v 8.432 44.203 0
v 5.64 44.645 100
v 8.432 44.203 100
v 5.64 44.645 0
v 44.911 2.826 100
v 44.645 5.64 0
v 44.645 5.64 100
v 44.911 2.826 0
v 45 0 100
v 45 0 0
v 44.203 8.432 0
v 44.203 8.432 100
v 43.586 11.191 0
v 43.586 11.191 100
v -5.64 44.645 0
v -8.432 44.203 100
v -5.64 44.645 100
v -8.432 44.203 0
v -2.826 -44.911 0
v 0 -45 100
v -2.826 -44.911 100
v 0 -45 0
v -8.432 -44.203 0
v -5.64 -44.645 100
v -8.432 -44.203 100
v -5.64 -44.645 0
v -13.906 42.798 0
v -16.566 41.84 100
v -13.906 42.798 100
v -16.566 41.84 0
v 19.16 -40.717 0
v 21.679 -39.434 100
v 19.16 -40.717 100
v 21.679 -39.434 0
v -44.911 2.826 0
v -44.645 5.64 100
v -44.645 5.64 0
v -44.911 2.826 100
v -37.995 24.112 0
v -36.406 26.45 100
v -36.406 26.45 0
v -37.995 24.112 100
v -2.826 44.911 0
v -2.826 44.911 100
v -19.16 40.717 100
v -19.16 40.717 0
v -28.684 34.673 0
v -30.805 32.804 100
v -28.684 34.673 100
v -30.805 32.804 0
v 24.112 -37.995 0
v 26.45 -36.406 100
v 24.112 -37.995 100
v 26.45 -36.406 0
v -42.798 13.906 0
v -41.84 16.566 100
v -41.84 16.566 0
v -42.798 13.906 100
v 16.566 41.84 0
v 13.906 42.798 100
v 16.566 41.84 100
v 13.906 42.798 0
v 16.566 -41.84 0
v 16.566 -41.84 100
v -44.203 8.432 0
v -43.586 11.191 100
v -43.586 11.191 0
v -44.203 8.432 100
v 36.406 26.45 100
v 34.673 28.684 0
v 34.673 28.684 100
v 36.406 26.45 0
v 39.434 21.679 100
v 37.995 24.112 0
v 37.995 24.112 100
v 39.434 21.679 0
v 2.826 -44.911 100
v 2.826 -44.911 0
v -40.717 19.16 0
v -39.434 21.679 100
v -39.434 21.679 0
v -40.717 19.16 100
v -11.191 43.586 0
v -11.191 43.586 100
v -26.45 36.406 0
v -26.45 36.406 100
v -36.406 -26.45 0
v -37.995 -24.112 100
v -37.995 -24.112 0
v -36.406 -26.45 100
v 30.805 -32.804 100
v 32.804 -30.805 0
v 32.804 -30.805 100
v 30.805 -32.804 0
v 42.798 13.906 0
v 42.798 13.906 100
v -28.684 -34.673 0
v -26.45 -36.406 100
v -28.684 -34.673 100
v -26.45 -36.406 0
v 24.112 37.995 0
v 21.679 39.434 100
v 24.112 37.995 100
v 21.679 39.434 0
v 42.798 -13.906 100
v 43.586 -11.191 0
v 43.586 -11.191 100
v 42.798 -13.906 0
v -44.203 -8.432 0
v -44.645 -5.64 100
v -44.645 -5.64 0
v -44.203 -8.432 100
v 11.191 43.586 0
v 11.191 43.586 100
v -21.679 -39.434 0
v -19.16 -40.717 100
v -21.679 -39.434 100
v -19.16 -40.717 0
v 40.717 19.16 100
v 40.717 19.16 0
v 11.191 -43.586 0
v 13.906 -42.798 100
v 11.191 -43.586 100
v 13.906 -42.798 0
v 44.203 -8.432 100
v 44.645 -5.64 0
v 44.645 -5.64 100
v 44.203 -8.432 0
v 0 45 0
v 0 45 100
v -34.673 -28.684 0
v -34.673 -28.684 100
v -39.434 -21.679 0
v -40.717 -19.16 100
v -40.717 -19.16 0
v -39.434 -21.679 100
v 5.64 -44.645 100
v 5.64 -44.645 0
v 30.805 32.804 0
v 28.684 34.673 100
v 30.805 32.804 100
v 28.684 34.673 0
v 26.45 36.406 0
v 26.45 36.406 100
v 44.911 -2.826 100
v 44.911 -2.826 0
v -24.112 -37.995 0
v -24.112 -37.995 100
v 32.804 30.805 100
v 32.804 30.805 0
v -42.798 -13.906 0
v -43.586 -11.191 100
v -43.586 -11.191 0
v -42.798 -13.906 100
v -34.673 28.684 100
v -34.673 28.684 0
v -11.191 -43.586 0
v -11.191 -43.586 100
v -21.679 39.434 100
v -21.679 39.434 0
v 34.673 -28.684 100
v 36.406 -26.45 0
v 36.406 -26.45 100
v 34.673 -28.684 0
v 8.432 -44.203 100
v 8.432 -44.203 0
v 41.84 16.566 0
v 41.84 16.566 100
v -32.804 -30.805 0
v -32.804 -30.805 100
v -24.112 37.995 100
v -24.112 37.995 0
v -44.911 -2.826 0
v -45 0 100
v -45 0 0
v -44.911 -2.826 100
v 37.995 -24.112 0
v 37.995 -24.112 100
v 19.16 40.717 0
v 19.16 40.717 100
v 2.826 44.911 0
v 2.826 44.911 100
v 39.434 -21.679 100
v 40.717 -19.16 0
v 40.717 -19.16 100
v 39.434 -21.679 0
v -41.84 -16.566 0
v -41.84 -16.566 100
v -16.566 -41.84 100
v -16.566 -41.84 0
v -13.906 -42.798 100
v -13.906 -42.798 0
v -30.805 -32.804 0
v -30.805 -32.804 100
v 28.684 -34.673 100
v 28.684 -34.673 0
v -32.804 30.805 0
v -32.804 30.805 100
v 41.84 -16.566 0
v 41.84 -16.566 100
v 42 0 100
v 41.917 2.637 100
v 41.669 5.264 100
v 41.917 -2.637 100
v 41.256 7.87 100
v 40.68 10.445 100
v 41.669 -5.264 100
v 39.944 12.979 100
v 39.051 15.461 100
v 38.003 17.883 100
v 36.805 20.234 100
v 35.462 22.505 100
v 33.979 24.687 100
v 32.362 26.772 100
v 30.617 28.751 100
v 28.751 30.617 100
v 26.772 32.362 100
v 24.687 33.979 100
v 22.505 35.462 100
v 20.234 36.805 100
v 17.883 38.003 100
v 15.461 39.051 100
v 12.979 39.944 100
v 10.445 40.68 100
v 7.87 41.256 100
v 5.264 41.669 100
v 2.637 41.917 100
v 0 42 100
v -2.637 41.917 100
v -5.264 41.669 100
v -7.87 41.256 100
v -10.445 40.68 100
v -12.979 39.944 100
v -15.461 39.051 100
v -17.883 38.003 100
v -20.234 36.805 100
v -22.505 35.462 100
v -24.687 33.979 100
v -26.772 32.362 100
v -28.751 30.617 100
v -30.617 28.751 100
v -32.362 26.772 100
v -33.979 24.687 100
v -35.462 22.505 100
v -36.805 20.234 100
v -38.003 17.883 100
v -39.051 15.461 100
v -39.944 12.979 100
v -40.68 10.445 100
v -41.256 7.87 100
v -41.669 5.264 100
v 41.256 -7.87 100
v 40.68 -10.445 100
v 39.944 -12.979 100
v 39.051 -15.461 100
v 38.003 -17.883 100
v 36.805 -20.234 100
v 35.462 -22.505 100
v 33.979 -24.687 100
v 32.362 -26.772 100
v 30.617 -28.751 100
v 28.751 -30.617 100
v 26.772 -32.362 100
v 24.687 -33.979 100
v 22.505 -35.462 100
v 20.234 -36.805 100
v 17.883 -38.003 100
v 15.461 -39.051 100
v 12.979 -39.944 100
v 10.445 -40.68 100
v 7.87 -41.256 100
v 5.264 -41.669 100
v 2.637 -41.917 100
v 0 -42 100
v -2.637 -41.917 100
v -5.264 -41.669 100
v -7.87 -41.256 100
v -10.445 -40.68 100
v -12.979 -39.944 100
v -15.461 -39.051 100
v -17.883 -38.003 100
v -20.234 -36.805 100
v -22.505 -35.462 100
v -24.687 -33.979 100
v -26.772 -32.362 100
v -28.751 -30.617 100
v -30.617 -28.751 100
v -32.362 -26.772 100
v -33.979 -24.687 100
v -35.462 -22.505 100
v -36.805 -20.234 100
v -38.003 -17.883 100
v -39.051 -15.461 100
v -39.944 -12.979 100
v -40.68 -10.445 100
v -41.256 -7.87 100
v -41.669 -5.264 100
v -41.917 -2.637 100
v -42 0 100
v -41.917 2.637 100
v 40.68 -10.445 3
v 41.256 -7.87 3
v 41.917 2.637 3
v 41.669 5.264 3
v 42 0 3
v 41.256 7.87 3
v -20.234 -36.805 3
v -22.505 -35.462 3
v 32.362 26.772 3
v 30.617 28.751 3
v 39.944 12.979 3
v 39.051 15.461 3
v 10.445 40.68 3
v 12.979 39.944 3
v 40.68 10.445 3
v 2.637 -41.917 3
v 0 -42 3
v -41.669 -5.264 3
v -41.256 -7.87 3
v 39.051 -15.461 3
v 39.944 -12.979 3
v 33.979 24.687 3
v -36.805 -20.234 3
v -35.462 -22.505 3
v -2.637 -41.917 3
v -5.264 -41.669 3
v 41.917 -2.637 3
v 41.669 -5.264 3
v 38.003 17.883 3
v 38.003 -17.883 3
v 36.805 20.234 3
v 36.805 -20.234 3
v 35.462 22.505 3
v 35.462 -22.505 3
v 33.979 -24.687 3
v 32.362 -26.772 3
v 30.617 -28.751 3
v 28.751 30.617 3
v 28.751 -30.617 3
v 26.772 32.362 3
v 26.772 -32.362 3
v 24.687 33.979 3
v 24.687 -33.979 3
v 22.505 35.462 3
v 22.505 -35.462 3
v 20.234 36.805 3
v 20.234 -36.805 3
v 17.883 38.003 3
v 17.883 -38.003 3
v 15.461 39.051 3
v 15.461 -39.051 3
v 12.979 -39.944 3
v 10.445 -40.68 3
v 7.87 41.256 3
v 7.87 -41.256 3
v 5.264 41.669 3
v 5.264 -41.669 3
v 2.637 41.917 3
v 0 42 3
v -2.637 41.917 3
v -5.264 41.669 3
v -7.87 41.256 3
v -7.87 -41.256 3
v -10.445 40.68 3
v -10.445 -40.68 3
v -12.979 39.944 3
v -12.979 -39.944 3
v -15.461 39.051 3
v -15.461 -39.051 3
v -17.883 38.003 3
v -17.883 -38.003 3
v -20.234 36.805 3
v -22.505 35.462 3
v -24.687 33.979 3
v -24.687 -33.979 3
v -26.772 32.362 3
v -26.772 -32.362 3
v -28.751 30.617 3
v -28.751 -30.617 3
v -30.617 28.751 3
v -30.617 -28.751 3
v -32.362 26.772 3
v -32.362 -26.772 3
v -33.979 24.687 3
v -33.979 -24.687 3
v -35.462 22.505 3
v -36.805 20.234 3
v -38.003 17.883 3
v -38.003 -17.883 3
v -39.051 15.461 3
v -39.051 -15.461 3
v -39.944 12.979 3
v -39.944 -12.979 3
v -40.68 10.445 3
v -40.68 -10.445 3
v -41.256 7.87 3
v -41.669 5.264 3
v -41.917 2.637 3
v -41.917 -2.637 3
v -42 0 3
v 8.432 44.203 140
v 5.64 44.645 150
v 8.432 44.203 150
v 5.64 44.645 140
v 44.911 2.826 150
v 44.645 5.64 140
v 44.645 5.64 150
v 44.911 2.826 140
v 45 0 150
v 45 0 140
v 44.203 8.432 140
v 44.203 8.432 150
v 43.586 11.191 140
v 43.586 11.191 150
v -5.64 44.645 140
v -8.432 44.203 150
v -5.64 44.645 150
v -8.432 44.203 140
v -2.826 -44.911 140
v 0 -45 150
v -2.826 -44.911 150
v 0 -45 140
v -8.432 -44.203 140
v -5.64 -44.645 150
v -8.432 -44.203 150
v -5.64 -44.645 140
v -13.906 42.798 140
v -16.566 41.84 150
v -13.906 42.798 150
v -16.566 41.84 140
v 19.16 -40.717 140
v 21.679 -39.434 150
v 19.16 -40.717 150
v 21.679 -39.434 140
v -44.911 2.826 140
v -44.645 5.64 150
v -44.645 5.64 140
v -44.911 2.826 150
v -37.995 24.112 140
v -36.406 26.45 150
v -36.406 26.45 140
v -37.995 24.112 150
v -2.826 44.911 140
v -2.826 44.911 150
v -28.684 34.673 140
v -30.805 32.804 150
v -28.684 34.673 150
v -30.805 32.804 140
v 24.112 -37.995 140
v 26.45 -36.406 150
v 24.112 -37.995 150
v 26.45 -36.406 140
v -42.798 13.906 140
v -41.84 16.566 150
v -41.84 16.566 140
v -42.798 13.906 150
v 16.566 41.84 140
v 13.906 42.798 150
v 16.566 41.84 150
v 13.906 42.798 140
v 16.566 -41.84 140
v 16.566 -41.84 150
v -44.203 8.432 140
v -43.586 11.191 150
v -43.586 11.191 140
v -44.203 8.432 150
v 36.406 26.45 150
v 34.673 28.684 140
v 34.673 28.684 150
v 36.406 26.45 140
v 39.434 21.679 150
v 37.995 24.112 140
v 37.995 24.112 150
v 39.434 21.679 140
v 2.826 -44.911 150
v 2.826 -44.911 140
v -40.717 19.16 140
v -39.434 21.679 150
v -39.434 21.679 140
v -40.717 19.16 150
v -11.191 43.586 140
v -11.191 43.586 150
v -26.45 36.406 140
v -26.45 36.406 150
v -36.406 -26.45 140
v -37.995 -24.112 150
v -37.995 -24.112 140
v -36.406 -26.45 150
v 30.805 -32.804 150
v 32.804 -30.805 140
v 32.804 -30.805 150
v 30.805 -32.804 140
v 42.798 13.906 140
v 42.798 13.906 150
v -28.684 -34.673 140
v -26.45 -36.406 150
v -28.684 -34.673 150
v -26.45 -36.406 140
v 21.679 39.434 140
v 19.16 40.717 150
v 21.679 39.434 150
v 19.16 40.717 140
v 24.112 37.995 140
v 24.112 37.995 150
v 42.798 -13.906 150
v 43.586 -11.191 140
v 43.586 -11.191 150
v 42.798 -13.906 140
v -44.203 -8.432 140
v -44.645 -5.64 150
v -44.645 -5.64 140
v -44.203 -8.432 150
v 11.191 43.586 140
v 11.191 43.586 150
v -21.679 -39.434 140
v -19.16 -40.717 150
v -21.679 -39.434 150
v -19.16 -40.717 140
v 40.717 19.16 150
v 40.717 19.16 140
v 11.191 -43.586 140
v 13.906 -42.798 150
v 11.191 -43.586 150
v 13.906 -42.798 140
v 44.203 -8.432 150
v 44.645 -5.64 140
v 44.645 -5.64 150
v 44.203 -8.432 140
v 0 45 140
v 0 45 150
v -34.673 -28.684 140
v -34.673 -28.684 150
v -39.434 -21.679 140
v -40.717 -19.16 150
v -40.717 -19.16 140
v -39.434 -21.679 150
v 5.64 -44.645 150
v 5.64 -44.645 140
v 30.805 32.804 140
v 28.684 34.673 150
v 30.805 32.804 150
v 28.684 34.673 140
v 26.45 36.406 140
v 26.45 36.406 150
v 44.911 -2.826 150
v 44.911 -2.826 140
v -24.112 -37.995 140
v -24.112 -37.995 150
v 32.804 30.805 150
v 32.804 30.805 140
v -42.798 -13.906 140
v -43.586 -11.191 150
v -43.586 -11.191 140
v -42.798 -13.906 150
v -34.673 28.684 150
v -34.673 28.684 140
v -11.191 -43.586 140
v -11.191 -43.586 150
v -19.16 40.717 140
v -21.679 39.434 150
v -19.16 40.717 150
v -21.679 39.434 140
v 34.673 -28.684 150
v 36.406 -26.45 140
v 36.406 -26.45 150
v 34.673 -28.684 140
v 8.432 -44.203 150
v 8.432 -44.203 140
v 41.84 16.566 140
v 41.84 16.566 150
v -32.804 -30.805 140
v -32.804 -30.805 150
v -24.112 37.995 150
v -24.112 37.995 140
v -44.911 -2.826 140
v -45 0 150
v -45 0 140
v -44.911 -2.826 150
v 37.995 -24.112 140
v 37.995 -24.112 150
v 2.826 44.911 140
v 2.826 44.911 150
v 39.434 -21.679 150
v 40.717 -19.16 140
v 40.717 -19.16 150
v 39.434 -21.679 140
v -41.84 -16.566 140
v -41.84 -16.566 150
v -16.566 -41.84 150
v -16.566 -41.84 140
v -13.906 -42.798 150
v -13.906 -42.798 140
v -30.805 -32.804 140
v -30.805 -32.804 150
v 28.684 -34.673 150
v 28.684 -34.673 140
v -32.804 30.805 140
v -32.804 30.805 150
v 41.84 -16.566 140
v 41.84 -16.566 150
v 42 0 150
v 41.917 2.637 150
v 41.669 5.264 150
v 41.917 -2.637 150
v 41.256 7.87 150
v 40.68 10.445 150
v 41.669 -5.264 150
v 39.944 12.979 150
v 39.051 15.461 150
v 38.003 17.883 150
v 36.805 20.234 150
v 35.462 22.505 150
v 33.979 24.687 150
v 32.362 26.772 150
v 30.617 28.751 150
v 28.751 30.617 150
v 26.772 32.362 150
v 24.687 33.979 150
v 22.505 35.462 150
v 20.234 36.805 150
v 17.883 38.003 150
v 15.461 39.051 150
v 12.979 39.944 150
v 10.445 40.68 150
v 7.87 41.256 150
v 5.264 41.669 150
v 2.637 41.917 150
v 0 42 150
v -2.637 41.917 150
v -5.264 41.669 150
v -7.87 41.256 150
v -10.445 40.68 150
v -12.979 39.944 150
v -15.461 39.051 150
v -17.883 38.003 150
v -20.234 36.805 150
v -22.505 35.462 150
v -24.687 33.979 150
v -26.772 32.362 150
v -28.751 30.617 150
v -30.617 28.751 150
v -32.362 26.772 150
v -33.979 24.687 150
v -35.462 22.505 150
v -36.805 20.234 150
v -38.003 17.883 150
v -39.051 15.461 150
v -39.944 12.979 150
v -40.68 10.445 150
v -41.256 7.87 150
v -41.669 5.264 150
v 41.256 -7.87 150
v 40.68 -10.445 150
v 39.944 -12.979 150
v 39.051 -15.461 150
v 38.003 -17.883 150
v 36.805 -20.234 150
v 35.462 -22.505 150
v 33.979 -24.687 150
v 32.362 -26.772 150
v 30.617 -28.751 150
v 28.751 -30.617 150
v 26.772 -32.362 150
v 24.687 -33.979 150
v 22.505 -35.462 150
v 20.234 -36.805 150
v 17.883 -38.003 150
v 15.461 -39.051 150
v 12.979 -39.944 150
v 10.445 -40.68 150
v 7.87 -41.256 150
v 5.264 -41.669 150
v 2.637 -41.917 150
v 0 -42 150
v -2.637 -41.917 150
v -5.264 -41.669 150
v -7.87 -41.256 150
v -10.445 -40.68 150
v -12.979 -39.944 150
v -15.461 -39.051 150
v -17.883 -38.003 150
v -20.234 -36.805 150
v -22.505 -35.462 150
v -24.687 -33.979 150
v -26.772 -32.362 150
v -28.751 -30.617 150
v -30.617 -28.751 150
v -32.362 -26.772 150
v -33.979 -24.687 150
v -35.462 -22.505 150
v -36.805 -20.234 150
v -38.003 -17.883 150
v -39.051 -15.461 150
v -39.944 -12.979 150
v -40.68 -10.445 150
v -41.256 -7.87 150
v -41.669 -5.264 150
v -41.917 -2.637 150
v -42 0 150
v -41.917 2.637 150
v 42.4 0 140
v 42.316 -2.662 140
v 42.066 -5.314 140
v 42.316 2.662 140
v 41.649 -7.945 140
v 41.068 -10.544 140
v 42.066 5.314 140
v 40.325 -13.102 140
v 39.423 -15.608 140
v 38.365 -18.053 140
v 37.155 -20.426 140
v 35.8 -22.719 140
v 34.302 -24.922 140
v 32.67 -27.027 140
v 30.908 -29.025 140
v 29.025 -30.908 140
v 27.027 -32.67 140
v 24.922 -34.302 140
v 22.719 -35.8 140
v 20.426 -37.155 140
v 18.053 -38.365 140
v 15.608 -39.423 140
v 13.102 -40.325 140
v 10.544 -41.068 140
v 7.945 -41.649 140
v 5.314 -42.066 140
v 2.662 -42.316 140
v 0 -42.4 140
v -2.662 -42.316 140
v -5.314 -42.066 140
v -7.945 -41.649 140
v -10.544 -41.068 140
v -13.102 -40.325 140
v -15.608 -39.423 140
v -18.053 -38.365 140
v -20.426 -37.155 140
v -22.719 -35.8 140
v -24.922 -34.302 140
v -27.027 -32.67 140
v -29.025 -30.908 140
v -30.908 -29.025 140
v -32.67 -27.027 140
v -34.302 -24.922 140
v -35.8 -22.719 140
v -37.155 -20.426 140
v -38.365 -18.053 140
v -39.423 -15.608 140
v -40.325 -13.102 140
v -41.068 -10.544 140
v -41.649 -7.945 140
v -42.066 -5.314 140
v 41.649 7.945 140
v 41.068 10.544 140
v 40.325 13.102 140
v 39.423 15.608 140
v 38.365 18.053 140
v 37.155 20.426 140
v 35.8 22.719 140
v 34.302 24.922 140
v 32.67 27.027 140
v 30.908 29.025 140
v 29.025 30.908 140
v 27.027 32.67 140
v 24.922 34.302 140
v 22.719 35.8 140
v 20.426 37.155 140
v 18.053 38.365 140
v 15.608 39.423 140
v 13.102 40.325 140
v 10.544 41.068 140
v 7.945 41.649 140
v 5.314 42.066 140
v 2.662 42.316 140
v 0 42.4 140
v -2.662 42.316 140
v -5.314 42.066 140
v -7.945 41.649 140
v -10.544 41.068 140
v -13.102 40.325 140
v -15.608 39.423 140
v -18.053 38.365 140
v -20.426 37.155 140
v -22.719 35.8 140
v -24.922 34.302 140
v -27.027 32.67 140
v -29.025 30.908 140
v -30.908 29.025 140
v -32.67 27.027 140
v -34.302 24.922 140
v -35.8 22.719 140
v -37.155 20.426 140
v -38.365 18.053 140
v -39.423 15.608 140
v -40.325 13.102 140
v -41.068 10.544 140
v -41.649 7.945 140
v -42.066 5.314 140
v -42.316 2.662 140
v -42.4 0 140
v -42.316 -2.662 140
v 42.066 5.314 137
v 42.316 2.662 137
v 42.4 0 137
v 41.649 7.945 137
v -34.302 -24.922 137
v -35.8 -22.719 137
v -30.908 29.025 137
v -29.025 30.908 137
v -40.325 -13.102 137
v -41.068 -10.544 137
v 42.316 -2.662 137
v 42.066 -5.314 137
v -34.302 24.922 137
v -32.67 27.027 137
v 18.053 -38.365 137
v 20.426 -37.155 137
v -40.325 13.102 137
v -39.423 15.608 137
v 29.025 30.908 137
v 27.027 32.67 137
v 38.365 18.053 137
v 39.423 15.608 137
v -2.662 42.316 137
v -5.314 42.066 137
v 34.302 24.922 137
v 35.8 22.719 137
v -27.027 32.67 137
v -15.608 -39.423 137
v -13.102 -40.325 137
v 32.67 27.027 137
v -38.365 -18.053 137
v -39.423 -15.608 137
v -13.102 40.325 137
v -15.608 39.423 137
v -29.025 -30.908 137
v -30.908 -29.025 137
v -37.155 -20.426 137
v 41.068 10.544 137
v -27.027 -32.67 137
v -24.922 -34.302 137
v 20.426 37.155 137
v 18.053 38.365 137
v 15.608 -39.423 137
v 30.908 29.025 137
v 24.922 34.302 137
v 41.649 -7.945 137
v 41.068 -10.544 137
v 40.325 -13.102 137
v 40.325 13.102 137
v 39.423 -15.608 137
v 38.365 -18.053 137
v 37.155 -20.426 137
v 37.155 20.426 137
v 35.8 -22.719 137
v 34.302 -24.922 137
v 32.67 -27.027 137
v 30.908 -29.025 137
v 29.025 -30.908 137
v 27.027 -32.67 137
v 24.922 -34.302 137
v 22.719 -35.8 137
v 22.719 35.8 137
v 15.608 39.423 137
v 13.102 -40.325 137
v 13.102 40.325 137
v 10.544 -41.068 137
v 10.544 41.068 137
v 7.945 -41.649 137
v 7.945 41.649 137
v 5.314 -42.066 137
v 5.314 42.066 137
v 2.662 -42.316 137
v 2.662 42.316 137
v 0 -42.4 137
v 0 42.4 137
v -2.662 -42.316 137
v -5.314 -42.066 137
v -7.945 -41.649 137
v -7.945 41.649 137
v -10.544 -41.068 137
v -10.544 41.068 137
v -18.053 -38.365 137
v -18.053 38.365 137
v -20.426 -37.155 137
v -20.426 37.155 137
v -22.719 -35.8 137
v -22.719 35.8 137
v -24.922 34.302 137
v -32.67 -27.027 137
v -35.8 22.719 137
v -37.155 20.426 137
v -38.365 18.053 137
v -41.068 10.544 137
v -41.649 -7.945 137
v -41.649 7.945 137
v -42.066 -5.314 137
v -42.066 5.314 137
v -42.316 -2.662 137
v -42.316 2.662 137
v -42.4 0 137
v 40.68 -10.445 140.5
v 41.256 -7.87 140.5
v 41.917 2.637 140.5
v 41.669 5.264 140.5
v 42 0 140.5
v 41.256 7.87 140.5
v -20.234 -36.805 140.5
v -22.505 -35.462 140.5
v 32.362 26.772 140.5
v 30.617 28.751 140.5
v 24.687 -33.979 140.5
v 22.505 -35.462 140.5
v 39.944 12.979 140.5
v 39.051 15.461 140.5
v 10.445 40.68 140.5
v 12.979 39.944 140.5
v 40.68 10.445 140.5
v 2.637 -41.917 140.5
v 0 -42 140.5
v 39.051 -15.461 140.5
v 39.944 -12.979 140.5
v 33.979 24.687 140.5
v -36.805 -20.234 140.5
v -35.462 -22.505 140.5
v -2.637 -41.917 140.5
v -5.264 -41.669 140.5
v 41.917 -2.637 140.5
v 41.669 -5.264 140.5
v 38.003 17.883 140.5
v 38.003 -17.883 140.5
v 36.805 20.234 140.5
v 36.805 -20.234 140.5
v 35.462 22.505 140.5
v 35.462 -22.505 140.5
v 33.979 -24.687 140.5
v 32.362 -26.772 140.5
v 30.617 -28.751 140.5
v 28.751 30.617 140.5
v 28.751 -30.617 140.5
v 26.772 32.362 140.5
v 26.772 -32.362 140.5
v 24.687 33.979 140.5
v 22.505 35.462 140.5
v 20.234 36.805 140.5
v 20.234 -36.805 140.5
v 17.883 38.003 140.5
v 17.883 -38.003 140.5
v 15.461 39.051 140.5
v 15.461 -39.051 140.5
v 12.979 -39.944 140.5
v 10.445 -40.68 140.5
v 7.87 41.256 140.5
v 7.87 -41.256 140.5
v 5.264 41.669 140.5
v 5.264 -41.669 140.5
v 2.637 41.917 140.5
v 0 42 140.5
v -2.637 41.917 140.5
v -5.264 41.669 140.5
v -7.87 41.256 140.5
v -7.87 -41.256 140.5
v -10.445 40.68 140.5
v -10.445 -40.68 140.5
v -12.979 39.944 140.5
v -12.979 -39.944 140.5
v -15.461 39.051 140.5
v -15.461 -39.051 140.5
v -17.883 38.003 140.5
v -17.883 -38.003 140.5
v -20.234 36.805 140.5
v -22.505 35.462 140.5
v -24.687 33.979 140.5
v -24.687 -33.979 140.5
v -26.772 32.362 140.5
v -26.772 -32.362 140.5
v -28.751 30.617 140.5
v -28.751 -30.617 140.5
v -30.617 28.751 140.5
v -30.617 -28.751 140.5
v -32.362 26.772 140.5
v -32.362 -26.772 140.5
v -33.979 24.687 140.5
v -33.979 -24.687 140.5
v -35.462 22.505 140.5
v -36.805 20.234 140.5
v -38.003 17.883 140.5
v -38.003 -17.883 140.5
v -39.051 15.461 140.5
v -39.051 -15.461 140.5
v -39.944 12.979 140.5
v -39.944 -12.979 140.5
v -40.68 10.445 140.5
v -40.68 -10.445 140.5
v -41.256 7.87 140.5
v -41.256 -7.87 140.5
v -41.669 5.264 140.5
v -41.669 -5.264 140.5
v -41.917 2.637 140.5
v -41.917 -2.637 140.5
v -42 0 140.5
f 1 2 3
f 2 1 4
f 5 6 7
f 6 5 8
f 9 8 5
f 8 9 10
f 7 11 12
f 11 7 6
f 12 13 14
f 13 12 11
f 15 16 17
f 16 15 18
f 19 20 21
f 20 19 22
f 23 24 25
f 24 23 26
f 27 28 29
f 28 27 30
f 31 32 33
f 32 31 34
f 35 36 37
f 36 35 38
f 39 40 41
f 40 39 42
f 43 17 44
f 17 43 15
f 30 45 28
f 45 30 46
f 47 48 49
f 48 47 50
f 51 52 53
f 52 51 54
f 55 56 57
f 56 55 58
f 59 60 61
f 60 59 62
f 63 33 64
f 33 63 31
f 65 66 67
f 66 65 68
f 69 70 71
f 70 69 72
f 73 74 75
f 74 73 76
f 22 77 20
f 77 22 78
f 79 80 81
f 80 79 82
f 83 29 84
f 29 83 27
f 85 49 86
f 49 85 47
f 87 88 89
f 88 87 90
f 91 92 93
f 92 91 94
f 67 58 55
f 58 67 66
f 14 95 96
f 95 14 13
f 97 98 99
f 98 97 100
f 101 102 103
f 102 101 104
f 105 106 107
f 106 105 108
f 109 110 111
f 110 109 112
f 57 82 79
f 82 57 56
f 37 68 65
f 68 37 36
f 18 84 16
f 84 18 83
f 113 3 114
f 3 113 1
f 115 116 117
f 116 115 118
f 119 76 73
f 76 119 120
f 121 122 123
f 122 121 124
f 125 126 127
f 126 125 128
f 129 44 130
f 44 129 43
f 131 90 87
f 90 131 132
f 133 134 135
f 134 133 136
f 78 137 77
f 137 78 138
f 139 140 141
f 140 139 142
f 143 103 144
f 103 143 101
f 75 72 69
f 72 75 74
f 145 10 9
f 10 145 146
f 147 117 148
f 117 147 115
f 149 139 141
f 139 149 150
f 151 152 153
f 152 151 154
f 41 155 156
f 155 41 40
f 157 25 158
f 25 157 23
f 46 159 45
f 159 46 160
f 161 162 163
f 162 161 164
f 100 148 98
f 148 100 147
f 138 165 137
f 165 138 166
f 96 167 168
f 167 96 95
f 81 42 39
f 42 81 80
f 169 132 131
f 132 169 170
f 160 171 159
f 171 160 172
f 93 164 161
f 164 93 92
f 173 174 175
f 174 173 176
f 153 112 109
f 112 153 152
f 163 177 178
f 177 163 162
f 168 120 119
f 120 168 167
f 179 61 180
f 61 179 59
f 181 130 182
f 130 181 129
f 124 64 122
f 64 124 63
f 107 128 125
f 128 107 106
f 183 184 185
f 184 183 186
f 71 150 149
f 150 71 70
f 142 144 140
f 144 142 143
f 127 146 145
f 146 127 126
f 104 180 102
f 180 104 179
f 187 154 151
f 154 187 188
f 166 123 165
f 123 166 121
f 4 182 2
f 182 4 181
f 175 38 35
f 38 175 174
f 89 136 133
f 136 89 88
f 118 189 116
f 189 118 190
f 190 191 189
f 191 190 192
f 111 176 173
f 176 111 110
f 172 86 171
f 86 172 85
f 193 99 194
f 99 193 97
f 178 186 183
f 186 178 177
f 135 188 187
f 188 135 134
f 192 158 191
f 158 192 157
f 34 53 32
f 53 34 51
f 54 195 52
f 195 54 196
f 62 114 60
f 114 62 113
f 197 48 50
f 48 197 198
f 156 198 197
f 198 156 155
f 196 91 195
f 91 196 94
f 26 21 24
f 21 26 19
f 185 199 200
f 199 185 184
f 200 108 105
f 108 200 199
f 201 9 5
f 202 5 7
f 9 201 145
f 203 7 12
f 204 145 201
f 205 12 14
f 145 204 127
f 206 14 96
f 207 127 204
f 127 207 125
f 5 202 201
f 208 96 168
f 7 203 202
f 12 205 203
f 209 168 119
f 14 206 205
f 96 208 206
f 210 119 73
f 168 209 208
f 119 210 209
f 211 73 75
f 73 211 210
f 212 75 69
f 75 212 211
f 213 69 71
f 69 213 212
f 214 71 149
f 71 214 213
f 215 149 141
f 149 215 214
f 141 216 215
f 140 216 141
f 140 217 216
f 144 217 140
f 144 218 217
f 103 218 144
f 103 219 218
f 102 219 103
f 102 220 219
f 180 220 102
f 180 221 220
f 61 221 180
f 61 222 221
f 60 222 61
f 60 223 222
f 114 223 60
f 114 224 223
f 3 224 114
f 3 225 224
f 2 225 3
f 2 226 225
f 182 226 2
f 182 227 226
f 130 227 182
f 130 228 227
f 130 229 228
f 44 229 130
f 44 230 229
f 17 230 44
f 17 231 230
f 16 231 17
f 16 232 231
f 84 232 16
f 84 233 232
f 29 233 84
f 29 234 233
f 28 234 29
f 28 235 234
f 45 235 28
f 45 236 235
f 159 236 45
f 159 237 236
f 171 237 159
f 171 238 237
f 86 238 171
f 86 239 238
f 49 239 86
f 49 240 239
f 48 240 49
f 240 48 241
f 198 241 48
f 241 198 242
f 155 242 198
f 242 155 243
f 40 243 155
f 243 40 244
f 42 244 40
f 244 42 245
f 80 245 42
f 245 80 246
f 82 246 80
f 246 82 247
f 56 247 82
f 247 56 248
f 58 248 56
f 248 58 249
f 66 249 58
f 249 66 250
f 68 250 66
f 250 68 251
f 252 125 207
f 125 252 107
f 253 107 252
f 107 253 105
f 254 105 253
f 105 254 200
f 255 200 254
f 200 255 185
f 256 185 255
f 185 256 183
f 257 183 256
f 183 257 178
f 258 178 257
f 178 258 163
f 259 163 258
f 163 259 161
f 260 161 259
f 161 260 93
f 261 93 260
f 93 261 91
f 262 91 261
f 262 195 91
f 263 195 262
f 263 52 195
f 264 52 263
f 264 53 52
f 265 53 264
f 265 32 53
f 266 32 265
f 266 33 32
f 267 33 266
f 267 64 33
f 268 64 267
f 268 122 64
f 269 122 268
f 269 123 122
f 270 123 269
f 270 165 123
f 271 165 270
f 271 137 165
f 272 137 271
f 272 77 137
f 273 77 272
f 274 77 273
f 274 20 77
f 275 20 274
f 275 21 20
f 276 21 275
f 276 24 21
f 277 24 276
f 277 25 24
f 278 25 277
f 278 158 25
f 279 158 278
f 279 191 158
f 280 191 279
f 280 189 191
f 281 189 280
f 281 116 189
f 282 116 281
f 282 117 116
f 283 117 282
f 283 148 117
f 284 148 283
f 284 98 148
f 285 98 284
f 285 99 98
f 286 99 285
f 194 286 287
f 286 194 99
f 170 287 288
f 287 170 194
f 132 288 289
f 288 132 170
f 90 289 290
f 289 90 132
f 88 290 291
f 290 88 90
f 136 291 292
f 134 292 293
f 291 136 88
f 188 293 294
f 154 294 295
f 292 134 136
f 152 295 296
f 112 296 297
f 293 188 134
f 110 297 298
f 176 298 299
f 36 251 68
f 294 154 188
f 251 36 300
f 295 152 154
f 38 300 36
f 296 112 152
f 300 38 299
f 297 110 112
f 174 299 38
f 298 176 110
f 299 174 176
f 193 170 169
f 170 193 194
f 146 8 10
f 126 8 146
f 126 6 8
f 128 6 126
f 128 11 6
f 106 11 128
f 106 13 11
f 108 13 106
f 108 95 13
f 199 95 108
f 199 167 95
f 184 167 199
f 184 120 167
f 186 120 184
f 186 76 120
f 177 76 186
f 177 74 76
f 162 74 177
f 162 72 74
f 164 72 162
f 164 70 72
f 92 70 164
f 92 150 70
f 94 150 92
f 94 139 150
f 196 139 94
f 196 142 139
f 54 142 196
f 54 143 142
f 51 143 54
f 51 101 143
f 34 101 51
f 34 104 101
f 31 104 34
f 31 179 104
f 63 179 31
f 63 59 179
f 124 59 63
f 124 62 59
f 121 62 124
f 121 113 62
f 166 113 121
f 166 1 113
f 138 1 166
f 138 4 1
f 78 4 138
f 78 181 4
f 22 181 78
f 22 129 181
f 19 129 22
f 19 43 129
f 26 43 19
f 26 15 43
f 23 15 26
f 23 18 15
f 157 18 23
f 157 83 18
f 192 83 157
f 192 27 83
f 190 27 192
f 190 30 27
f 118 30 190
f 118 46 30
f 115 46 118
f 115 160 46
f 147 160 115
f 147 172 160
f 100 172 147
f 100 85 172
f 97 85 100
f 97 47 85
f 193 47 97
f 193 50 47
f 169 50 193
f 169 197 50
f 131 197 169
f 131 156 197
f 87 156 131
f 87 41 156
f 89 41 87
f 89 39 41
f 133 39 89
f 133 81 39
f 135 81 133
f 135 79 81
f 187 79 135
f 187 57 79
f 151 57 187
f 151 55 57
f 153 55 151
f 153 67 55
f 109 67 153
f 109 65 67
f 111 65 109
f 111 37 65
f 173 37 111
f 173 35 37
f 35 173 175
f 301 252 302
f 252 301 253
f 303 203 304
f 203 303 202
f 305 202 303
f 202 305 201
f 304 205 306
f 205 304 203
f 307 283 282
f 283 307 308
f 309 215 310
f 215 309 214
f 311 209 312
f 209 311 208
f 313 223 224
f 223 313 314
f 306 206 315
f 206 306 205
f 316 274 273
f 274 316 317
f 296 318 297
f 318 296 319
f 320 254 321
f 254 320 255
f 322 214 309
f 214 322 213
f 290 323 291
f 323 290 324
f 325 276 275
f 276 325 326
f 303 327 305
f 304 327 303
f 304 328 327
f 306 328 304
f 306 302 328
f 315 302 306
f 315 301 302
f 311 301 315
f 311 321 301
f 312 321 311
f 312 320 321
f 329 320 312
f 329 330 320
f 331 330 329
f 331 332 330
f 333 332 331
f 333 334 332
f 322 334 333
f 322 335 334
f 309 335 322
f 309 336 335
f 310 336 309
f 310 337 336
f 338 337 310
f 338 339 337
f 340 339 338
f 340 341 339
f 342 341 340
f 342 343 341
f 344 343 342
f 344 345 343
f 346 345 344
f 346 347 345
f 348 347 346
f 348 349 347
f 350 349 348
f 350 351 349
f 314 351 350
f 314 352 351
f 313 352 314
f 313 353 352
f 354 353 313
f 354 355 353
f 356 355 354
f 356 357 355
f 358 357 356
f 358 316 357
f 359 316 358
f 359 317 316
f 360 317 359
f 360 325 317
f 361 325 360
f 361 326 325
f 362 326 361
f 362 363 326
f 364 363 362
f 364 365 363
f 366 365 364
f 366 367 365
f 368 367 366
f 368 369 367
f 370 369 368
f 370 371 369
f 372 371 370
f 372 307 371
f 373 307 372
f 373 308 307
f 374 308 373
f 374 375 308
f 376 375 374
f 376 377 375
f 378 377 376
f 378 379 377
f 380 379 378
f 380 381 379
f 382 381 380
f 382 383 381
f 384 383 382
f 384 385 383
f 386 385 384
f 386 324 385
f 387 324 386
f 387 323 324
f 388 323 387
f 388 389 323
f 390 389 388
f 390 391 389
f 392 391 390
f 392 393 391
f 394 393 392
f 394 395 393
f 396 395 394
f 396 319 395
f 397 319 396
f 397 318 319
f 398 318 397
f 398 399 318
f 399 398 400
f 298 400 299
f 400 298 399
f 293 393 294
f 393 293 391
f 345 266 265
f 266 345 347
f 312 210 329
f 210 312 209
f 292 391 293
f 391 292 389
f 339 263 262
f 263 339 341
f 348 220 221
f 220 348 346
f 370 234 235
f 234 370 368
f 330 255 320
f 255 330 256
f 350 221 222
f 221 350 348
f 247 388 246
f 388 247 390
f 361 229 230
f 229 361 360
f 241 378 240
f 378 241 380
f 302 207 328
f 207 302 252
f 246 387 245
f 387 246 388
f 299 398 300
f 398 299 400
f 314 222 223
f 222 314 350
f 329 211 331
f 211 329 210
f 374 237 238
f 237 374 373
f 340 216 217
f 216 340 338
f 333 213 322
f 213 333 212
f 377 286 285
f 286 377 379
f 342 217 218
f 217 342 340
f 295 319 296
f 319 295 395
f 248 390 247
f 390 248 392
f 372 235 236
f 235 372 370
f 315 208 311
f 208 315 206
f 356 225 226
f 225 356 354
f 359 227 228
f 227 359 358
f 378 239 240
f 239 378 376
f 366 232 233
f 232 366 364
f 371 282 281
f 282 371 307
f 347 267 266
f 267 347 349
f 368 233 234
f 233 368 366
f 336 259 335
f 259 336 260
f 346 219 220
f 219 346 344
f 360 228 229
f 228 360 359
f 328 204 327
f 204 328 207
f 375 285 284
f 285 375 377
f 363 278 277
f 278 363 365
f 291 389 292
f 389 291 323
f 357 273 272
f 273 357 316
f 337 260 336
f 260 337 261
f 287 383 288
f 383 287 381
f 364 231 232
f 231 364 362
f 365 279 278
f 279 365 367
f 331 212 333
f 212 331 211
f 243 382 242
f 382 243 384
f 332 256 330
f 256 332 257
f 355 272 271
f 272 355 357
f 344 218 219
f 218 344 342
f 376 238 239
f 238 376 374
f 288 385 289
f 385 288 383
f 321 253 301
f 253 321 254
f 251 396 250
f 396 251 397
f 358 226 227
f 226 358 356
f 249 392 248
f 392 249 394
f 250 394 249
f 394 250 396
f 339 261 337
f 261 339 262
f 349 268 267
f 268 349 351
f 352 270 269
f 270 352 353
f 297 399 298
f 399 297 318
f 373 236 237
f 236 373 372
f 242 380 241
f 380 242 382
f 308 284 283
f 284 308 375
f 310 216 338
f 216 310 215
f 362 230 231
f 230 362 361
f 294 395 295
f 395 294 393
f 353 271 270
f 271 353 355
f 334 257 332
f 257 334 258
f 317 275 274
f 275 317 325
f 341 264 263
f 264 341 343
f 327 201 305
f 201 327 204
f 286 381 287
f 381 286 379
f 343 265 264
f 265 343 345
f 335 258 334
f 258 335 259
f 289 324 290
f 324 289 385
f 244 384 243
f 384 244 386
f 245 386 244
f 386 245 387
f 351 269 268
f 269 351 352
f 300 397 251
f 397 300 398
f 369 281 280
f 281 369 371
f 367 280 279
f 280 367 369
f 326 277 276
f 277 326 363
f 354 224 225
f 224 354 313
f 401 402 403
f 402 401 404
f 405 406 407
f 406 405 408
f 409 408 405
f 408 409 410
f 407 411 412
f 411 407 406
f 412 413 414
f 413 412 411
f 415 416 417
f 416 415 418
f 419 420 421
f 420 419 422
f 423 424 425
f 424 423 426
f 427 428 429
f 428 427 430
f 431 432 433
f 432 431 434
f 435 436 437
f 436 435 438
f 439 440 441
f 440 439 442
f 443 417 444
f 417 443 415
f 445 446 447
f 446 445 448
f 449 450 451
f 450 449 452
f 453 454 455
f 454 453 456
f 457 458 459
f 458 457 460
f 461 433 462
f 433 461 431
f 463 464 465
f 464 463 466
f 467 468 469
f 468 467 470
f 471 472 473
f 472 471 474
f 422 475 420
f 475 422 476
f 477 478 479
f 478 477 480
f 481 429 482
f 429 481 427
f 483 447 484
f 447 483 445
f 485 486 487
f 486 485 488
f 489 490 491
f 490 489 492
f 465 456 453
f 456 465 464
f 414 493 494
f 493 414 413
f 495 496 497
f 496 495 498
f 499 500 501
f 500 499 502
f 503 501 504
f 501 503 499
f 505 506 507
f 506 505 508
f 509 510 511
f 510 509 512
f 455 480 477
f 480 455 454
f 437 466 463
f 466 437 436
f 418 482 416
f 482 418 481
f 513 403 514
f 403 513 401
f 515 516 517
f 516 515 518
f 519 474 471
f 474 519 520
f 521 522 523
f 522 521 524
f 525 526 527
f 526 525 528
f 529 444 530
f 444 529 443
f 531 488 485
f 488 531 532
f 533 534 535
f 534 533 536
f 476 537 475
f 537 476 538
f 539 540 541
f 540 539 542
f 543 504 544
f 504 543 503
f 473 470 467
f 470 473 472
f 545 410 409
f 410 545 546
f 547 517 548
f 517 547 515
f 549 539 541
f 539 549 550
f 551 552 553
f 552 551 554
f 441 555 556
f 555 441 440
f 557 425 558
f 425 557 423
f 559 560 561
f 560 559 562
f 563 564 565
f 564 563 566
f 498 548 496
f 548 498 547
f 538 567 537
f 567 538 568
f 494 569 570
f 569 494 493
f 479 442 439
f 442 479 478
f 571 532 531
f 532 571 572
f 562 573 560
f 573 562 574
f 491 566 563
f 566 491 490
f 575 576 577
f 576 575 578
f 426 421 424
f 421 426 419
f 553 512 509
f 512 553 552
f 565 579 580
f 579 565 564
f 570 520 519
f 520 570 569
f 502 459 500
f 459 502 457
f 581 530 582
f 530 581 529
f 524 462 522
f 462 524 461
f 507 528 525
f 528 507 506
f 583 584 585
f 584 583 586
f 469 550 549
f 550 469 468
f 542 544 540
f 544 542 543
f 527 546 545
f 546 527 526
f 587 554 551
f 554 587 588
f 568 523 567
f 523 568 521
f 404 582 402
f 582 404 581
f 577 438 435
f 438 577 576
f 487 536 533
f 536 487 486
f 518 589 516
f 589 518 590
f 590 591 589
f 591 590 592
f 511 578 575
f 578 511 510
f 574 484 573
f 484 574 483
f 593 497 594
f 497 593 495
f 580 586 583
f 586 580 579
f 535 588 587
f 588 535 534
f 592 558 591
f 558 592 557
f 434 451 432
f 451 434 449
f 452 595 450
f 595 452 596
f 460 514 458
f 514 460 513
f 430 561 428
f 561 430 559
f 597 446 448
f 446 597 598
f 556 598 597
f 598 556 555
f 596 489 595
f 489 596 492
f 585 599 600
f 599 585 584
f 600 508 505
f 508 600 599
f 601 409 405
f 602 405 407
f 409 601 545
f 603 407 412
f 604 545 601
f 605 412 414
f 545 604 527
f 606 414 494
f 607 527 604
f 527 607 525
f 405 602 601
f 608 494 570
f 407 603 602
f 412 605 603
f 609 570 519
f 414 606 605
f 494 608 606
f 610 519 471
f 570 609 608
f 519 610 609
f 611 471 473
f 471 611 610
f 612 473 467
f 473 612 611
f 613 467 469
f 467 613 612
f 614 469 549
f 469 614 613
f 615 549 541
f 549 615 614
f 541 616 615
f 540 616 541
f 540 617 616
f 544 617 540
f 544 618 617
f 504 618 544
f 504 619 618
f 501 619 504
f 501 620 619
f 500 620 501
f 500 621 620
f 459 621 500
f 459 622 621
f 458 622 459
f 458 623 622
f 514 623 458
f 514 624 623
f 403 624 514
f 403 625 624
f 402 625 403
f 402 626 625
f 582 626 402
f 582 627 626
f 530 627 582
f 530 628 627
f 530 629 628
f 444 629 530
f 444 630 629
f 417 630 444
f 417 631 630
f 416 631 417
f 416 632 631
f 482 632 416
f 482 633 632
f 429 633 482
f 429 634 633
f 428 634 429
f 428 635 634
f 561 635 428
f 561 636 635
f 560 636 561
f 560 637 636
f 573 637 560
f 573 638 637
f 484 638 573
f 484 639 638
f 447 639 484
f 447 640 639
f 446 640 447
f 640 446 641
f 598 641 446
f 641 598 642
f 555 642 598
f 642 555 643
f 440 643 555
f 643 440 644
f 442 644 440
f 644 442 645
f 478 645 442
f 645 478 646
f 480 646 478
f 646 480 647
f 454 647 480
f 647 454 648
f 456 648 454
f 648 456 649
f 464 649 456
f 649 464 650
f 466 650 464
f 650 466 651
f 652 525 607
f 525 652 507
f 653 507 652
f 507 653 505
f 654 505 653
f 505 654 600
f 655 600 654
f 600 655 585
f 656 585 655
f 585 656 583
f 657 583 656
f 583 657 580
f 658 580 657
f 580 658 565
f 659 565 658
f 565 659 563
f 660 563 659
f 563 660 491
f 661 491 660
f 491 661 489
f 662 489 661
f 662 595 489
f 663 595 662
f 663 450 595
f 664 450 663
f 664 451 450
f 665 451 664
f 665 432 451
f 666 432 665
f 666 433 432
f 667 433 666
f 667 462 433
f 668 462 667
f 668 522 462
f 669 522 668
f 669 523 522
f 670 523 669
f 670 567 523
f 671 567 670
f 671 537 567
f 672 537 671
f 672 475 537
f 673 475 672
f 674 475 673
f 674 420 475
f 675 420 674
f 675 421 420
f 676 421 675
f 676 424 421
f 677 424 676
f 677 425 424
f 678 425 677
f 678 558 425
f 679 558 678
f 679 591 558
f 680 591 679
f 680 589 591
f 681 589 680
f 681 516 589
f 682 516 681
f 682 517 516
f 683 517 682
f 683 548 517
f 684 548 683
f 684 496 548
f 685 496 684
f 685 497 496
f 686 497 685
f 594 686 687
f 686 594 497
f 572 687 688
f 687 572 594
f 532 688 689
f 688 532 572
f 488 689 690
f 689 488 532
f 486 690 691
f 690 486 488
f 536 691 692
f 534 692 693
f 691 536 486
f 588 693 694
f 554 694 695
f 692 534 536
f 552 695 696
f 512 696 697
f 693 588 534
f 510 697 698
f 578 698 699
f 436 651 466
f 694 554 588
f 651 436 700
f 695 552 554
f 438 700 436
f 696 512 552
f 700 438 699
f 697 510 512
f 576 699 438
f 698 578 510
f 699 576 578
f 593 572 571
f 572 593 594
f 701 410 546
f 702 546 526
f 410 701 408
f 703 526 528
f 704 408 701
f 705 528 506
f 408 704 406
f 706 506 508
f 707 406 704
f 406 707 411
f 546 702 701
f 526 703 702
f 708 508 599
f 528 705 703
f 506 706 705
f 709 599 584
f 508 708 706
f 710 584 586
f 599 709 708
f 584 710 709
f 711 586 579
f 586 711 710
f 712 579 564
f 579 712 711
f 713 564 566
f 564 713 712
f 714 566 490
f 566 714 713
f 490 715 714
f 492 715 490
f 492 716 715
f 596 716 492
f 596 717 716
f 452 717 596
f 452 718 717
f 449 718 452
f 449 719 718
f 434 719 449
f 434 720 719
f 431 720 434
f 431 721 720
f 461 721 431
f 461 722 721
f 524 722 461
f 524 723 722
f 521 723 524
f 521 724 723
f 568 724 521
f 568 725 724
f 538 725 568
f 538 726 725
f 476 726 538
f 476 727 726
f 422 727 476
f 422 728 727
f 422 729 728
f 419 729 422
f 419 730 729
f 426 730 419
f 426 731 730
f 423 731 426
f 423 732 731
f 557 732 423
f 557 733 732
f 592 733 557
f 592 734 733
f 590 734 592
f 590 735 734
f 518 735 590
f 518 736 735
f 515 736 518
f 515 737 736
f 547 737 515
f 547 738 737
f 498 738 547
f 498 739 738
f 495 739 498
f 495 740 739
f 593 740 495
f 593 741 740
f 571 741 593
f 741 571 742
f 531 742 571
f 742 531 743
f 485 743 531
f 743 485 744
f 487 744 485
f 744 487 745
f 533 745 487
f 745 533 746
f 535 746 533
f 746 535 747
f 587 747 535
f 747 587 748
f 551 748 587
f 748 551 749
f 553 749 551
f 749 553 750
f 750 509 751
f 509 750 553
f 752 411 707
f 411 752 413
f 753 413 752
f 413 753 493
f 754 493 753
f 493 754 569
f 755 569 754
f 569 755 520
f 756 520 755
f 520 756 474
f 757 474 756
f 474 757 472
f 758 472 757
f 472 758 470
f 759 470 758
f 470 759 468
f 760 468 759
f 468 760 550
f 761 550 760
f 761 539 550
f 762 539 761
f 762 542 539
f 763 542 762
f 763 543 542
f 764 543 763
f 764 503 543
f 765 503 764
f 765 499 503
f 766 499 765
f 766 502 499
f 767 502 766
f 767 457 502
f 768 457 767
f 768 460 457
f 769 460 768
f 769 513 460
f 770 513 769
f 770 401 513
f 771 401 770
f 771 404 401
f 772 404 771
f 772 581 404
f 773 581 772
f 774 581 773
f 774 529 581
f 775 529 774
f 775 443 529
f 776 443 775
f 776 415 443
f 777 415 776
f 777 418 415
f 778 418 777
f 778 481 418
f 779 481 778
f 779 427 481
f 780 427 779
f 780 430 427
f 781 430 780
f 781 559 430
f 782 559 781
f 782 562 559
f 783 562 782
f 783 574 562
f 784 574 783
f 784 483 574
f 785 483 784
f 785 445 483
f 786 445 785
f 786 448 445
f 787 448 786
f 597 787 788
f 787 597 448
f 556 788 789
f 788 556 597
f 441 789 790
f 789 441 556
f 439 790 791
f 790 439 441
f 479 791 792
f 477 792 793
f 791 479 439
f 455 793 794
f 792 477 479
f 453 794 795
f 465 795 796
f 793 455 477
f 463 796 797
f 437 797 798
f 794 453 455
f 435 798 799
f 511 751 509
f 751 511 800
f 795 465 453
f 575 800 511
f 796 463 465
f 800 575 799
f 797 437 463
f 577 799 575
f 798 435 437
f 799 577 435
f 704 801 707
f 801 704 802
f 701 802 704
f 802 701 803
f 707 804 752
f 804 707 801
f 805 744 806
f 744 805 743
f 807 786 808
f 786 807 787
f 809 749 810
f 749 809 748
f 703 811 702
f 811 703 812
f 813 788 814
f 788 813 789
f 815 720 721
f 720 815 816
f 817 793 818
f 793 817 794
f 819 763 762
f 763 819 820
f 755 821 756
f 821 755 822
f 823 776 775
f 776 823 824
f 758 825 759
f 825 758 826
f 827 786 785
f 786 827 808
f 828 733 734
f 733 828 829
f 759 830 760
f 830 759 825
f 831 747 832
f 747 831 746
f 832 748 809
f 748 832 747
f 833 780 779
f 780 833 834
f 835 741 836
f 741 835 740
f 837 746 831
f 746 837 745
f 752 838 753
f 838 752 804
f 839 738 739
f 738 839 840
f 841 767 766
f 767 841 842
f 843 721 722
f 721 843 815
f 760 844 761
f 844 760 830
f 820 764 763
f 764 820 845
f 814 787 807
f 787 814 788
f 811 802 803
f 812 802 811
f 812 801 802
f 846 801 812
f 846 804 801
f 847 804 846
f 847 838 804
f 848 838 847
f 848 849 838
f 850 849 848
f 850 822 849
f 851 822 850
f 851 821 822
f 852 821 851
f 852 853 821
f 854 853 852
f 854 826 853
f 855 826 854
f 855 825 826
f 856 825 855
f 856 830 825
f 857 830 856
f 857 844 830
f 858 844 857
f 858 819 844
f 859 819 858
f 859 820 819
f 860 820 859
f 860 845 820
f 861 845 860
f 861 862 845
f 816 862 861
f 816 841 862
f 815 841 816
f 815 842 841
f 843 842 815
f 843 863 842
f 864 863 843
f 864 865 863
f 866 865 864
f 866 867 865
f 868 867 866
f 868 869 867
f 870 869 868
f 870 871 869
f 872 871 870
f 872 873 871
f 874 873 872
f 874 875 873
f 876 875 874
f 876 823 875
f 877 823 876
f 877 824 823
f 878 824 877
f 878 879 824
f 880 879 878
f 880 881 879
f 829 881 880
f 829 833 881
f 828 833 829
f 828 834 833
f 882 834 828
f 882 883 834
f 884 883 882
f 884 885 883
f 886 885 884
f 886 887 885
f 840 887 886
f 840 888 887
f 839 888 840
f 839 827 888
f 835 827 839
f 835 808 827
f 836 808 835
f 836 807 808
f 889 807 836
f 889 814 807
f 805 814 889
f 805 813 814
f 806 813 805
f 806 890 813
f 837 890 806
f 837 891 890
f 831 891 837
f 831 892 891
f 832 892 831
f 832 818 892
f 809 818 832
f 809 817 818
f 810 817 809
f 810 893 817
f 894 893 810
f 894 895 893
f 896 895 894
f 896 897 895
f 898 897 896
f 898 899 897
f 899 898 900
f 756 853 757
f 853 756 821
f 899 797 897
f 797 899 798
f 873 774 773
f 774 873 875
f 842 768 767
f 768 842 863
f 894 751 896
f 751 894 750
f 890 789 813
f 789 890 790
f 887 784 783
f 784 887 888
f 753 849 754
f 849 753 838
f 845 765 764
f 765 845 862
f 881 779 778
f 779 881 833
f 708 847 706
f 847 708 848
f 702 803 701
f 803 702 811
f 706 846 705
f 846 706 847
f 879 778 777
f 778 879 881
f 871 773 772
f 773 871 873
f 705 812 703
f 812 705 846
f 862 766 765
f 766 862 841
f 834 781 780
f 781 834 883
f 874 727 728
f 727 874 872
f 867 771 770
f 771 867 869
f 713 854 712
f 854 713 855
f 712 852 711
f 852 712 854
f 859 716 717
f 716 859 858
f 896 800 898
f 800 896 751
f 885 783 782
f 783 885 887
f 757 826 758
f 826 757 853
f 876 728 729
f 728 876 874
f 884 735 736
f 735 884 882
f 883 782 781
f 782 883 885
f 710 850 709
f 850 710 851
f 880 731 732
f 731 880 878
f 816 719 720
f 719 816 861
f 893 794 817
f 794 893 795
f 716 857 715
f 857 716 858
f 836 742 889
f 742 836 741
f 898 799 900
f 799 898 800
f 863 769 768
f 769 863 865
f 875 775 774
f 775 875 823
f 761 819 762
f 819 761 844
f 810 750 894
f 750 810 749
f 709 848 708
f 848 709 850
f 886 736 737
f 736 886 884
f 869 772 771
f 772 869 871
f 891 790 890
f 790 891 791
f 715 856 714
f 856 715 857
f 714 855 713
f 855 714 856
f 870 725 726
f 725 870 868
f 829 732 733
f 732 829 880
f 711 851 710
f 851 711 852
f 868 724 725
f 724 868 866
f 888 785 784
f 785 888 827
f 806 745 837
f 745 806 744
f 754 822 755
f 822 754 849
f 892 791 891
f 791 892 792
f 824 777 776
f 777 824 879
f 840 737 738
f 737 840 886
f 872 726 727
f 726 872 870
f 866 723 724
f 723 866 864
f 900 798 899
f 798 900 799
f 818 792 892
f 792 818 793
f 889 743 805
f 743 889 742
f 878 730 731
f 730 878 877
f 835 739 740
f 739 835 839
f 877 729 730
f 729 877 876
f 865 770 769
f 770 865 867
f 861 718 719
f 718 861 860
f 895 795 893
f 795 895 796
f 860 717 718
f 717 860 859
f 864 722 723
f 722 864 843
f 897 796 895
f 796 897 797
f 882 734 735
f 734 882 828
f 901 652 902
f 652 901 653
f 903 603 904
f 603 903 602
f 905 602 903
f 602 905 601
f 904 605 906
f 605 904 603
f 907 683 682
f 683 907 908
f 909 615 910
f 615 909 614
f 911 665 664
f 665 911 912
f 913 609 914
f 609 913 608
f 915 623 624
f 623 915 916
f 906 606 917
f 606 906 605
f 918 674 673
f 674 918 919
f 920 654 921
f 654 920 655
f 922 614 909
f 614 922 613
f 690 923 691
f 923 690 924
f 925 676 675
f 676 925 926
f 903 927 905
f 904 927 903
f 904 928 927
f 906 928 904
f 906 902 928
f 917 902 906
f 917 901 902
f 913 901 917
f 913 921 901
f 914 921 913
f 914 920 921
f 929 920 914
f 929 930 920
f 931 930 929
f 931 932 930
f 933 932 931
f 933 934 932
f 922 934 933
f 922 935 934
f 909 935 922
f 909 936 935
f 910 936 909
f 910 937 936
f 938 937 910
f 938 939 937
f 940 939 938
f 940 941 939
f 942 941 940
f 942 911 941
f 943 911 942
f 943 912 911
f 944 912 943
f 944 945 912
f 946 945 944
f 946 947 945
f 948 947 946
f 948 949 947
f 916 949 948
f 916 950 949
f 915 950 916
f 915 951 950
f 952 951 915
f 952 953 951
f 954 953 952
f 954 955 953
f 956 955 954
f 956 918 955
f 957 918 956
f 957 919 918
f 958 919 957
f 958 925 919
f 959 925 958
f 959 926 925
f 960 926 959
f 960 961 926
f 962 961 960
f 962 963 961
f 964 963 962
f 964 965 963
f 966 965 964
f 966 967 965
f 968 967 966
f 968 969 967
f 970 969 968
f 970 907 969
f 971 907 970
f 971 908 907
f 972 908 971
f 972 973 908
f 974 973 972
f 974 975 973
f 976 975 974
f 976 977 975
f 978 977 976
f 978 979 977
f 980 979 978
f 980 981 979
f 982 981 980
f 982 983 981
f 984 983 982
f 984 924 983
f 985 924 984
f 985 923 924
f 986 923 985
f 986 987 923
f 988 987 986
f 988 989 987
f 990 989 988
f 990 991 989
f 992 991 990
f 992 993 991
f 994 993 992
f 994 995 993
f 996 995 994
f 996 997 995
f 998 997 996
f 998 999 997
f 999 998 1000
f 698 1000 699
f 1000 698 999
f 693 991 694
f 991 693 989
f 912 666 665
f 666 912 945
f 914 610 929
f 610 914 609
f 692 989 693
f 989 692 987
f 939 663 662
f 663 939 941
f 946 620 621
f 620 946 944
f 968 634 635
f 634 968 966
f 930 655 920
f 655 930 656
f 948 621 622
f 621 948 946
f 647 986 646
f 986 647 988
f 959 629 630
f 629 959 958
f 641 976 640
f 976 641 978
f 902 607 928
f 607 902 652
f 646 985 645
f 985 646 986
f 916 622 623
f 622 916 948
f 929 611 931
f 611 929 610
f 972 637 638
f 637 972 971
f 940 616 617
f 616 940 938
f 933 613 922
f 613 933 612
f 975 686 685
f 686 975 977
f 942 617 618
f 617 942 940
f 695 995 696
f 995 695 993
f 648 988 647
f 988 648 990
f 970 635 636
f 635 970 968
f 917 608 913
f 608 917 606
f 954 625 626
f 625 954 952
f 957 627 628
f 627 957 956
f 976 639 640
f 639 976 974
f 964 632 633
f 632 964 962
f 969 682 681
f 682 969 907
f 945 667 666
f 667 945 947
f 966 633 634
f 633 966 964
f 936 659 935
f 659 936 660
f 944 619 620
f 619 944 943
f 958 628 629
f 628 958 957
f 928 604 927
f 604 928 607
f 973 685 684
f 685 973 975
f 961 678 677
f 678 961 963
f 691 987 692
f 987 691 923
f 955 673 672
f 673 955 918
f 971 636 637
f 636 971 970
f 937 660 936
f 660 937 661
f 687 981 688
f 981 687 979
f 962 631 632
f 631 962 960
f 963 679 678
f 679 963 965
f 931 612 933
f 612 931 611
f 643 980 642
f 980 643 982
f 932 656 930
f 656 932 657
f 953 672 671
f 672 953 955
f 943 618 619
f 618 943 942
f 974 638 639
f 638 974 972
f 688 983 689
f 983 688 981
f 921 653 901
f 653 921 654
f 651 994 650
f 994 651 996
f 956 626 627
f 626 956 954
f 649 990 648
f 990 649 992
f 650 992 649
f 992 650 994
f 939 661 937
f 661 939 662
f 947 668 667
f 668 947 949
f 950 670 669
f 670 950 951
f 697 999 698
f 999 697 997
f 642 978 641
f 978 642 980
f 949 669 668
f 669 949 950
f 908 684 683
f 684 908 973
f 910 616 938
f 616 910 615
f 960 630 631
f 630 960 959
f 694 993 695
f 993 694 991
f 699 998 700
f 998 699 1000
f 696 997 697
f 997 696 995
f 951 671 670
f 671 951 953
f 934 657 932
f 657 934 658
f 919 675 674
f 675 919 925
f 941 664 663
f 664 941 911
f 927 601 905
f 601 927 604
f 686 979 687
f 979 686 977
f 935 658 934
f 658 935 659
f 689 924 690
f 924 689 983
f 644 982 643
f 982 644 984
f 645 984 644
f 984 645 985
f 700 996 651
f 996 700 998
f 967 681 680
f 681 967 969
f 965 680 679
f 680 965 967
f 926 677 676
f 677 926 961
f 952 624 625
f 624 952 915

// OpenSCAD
// Parámetros generales
diametro_exterior = 90;
altura_envase = 100;
grosor_pared = 3;
ajuste_tapa = 0.4; // Holgura para que la tapa entre sin atascarse
altura_tapa = 10;
$fn = 100; // suavidad de círculo

// ----------------------------------
// Envase
// ----------------------------------
color([0.349, 0.788, 0.647])
difference() {
    // Cuerpo exterior
    cylinder(h = altura_envase, r = diametro_exterior / 2);

    // Hueco interior
    translate([0, 0, grosor_pared])
        cylinder(h = altura_envase - grosor_pared, r = (diametro_exterior / 2) - grosor_pared);
}

// ----------------------------------
// Tapa a presión (ahora visible separada)
// ----------------------------------

// Desplazamos la tapa 20 mm arriba del envase para visualizarla
desfase_tapa = 40;

color([0.2, 0.6, 0.8])
translate([0, 0, altura_envase + desfase_tapa])
difference() {
    union() {
        // Disco exterior visible
        cylinder(h = altura_tapa, r = diametro_exterior / 2);

        // Reborde de presión
        translate([0, 0, -3])
            cylinder(h = 3, r = (diametro_exterior / 2) - grosor_pared + ajuste_tapa);
    }

    // Hueco interior de la tapa (opcional para aligerar)
    translate([0, 0, 0.5])
        cylinder(h = altura_tapa - 0.5, r = (diametro_exterior / 2) - grosor_pared);
}
